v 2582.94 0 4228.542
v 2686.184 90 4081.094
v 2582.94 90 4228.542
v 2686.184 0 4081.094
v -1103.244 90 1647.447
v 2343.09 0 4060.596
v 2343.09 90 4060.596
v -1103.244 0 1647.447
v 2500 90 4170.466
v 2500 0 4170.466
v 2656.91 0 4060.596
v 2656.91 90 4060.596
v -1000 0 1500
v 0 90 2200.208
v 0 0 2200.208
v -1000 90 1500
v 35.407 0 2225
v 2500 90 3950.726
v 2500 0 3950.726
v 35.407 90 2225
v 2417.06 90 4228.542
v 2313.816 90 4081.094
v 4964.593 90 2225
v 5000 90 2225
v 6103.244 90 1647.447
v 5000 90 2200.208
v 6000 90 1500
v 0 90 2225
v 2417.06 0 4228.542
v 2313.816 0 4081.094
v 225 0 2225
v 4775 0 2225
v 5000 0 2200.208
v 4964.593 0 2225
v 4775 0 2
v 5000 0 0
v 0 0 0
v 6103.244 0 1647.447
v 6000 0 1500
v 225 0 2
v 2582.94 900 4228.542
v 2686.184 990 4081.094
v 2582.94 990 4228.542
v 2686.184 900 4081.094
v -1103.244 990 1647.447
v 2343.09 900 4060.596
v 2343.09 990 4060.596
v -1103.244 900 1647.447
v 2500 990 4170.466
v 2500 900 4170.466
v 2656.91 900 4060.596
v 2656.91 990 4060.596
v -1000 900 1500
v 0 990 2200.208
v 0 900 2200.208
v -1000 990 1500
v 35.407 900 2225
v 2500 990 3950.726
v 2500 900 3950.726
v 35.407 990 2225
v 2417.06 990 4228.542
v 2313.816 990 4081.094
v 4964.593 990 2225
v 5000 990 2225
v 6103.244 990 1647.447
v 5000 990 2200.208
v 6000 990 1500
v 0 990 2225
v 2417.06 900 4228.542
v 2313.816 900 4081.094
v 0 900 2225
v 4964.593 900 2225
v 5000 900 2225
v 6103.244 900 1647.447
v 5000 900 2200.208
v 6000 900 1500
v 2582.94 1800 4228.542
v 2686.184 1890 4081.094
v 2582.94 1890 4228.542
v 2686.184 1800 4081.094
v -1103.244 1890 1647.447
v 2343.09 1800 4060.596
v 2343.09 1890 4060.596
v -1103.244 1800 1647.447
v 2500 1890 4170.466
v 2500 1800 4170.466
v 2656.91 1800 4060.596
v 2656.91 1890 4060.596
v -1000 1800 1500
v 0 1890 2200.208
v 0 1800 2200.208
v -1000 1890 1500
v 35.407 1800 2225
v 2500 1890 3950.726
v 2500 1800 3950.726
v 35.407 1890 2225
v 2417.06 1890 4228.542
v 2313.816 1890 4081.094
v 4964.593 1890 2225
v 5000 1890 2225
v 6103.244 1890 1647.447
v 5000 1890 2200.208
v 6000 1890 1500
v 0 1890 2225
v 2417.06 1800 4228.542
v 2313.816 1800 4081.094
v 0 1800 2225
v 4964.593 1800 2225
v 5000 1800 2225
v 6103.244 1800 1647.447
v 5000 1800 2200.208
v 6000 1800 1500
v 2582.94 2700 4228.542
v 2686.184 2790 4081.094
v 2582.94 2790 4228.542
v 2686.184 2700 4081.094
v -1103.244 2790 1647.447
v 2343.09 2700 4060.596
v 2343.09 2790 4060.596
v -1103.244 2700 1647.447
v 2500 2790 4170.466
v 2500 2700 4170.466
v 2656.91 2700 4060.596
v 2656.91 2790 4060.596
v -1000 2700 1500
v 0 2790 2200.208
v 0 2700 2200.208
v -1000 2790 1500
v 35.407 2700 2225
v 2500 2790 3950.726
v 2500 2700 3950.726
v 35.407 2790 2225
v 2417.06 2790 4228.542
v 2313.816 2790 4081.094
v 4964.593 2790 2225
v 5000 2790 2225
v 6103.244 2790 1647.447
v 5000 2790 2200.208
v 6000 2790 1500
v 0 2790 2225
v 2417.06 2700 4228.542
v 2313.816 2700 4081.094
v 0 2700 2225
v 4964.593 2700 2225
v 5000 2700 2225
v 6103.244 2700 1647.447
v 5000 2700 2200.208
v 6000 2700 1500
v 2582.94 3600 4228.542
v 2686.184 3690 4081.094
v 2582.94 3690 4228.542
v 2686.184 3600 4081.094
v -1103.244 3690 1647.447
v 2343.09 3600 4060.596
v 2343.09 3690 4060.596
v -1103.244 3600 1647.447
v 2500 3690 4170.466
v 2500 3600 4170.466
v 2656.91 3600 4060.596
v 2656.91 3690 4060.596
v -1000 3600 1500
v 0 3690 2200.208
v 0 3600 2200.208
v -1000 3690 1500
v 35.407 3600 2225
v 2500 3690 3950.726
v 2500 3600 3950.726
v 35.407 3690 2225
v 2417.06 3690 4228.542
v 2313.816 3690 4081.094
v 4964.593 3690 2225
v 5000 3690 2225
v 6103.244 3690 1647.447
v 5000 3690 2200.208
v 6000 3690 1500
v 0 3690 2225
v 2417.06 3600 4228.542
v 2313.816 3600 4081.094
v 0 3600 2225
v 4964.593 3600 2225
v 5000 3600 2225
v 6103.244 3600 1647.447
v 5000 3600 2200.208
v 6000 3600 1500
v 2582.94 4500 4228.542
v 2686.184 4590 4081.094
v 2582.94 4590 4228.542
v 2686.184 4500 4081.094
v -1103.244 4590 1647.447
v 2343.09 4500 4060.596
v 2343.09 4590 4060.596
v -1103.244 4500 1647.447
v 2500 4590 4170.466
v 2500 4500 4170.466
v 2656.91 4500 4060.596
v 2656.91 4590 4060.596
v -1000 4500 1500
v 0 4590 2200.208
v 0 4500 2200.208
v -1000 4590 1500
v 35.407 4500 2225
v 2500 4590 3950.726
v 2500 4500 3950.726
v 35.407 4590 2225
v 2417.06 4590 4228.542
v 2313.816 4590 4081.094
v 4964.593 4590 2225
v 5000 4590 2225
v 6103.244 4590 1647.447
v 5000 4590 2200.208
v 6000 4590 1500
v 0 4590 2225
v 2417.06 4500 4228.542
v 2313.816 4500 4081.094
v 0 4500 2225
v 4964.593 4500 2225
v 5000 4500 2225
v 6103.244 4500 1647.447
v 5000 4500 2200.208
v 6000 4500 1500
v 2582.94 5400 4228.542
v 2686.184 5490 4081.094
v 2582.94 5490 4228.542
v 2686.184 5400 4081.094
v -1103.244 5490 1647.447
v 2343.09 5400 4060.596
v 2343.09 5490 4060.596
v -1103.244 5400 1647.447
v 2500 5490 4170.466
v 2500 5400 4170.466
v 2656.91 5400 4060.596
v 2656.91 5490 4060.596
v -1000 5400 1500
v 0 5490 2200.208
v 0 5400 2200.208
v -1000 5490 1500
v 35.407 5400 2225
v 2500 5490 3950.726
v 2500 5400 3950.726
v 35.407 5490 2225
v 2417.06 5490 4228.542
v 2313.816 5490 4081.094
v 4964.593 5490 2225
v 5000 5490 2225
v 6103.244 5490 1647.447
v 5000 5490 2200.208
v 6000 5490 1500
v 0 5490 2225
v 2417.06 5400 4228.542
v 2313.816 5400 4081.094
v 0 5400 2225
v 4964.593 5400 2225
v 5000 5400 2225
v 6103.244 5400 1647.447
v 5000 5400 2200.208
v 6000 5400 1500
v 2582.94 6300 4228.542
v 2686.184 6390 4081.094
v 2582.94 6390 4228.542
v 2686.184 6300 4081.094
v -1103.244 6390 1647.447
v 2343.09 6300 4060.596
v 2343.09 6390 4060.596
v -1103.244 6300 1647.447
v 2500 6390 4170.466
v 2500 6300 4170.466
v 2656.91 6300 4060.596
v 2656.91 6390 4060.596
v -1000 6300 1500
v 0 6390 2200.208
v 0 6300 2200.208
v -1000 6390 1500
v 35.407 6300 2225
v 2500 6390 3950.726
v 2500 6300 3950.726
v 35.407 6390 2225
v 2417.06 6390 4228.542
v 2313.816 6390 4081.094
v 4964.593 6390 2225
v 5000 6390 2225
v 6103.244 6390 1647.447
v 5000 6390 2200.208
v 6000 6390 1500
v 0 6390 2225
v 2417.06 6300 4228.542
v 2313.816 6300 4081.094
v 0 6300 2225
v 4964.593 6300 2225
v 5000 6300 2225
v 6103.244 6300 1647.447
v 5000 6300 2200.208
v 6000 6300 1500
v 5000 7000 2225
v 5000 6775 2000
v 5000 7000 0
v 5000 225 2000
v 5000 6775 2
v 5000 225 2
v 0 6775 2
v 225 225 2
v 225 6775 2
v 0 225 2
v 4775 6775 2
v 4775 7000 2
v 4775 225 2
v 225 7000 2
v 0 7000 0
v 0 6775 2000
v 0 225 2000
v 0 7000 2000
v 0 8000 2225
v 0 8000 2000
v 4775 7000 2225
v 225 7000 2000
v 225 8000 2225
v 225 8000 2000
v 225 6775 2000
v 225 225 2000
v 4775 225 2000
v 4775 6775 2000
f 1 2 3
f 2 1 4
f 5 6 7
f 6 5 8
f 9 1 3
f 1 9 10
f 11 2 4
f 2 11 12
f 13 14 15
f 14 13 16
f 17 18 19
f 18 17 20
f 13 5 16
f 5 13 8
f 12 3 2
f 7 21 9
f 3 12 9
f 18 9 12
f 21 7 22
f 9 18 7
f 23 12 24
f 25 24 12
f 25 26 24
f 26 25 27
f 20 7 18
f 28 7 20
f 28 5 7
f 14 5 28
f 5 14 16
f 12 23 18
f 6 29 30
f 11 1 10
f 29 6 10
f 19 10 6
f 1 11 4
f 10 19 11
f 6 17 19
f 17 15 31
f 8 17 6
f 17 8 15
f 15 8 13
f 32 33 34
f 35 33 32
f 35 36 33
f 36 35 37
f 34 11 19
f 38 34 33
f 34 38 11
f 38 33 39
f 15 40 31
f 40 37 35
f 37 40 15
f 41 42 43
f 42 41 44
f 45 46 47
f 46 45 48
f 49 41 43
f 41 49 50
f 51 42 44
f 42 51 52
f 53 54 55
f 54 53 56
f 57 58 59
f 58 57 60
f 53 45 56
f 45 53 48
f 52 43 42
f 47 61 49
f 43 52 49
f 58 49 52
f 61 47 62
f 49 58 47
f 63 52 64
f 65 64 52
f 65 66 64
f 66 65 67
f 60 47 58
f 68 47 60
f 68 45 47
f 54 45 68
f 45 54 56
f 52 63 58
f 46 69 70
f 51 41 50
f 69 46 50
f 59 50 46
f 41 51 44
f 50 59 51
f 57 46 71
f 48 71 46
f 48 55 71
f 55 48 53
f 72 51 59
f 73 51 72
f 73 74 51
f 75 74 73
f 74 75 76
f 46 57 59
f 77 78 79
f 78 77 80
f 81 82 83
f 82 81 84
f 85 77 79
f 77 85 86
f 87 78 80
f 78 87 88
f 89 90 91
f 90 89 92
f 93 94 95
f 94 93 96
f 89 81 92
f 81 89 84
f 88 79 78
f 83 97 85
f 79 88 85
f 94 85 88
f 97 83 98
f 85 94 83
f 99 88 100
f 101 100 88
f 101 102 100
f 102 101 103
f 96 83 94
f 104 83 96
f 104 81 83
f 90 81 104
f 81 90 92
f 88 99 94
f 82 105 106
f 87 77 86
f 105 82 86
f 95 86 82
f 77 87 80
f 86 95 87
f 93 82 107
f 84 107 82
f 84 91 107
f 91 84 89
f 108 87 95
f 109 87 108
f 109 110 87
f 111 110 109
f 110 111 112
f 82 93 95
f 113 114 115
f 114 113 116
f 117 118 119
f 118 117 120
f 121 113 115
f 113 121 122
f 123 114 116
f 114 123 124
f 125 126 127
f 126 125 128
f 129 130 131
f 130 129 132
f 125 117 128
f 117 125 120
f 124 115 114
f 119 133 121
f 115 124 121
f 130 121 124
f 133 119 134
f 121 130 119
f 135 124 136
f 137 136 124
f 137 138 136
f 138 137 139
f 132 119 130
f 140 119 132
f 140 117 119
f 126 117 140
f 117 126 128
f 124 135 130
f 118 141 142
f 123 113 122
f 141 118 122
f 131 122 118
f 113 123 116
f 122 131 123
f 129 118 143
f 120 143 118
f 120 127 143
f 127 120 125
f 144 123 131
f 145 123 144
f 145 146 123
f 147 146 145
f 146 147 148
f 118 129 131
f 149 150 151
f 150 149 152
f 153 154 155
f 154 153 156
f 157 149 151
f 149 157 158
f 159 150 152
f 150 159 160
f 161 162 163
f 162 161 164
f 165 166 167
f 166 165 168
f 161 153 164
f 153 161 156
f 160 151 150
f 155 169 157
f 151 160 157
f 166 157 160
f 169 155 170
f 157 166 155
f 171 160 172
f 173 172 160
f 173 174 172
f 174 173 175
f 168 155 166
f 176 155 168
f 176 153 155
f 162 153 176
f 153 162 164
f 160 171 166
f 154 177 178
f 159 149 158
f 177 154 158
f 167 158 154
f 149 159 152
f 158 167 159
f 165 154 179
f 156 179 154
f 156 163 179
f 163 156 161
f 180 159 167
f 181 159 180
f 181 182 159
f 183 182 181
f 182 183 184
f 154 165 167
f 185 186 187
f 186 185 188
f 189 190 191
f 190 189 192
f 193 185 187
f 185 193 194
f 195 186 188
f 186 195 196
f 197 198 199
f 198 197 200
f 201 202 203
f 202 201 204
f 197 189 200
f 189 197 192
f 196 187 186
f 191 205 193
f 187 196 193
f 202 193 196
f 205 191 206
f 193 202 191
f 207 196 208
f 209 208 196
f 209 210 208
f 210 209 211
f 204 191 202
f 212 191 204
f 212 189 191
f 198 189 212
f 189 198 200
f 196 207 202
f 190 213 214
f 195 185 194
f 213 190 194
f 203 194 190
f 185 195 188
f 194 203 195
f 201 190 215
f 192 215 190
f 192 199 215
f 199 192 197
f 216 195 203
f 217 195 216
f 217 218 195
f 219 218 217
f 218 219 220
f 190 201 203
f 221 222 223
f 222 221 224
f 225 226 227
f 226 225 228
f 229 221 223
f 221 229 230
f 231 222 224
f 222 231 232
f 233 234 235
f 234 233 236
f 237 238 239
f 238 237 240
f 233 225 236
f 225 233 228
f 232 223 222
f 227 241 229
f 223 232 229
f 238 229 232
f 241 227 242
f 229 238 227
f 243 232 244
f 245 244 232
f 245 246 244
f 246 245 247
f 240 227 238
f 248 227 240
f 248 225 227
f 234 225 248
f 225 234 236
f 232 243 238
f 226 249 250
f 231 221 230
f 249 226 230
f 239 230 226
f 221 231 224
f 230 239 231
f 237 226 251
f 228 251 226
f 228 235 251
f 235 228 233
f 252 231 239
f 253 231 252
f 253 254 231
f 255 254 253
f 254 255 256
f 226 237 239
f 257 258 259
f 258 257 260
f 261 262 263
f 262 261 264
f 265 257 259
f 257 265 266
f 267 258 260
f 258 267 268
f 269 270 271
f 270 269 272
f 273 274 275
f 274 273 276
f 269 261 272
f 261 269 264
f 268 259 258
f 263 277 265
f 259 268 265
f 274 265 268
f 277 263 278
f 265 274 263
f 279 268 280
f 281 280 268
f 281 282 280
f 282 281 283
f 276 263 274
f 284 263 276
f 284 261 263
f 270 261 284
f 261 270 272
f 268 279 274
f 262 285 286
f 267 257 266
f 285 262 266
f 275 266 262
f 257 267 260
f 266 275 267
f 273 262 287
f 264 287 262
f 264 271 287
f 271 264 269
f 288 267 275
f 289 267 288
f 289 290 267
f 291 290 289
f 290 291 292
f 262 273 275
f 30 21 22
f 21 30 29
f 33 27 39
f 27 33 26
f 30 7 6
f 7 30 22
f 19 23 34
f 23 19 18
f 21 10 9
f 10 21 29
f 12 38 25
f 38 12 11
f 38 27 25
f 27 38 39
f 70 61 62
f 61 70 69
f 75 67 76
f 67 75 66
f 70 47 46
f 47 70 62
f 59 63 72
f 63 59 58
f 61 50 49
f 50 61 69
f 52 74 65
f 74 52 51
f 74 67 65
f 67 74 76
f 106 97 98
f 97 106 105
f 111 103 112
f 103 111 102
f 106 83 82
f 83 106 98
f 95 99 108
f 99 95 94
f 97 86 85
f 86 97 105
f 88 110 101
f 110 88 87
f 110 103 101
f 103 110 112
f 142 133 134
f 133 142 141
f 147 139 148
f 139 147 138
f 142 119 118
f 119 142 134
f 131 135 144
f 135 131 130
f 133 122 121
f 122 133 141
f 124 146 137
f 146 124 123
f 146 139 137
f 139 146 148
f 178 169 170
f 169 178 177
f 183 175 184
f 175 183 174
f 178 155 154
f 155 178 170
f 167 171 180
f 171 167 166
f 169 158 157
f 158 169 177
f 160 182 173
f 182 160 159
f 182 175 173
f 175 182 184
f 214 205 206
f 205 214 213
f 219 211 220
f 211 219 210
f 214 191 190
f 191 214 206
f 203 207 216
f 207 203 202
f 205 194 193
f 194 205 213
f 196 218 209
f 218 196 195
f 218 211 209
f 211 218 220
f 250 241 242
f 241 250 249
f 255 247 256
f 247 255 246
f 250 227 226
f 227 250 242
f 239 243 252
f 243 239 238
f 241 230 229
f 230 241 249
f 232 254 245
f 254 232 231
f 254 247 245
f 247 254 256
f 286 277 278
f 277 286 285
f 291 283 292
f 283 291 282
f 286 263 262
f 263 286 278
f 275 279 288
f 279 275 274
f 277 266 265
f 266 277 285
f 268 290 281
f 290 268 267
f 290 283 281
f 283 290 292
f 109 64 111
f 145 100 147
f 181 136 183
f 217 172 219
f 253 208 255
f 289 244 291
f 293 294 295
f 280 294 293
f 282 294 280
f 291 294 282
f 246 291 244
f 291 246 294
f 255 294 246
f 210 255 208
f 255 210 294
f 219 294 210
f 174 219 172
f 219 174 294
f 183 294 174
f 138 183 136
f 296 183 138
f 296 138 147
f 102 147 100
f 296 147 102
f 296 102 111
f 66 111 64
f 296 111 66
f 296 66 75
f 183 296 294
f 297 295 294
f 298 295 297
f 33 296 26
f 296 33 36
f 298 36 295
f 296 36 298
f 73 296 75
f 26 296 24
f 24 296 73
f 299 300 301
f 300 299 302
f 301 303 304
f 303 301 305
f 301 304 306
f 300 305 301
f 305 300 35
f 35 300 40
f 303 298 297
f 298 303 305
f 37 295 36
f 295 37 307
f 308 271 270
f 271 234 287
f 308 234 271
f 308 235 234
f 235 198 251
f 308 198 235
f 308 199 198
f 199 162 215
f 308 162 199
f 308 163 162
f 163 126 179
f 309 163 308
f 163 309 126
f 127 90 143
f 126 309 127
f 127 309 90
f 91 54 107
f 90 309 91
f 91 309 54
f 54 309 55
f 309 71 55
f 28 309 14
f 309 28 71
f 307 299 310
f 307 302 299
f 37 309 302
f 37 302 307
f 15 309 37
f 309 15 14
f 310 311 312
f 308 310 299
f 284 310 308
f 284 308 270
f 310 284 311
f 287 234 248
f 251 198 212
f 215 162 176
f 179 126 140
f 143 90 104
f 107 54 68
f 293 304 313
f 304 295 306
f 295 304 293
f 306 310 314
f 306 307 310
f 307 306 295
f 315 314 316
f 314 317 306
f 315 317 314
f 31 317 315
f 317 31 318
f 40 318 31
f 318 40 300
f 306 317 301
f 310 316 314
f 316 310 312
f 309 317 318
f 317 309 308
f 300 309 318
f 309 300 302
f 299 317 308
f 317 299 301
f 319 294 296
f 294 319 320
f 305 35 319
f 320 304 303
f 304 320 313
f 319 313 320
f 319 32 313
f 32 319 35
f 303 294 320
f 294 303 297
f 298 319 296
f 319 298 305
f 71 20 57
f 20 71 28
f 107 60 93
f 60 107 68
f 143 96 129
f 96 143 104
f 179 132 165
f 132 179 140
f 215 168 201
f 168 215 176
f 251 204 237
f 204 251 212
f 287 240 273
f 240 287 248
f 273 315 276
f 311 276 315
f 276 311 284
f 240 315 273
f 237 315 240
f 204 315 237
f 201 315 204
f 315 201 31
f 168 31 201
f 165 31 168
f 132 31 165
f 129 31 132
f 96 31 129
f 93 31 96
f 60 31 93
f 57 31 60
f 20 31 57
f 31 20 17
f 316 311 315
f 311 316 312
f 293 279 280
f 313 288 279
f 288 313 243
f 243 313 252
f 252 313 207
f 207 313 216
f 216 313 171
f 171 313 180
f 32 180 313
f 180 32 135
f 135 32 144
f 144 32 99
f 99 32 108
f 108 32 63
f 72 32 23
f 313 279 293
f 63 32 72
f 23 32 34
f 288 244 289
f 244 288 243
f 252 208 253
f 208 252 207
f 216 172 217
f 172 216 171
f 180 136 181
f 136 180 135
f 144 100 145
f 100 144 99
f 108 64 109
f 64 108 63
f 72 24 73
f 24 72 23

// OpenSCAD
area_x = 5000;
area_y = 7000;
height = 2000;
brick_ = 225;


// Base
cube([area_x, area_y, 2],0);

// Main brick postures
cube([brick_,brick_,height], 0);

translate([0,area_y-brick_,0])
cube([brick_,brick_,height], 0);

translate([area_x-brick_,area_y-brick_,0])
cube([brick_,brick_,height], 0);

translate([area_x-brick_,0,0])
cube([brick_,brick_,height], 0);

// 
translate([0,0,height])
cube([brick_,area_y+1000,brick_], 0);

translate([area_x-brick_,0,height])
cube([brick_,area_y,brick_], 0);

translate([-1000, 0, height-500]) {
    rotate(a = -35, v = [0, 1, 0]) {
        for (a =[0:900:area_y]) {
            translate([0, a, 0])
            cube([4500, 90, 180], 0);    
        }
    }
}

translate([area_x+1000, 0, height-500]) {
    rotate(a = 180+35, v = [0, 1, 0]) {
        for (a =[0:900:area_y]) {
            translate([0, a, -180])
            cube([4500, 90, 180], 0);    
        }
    }
}
